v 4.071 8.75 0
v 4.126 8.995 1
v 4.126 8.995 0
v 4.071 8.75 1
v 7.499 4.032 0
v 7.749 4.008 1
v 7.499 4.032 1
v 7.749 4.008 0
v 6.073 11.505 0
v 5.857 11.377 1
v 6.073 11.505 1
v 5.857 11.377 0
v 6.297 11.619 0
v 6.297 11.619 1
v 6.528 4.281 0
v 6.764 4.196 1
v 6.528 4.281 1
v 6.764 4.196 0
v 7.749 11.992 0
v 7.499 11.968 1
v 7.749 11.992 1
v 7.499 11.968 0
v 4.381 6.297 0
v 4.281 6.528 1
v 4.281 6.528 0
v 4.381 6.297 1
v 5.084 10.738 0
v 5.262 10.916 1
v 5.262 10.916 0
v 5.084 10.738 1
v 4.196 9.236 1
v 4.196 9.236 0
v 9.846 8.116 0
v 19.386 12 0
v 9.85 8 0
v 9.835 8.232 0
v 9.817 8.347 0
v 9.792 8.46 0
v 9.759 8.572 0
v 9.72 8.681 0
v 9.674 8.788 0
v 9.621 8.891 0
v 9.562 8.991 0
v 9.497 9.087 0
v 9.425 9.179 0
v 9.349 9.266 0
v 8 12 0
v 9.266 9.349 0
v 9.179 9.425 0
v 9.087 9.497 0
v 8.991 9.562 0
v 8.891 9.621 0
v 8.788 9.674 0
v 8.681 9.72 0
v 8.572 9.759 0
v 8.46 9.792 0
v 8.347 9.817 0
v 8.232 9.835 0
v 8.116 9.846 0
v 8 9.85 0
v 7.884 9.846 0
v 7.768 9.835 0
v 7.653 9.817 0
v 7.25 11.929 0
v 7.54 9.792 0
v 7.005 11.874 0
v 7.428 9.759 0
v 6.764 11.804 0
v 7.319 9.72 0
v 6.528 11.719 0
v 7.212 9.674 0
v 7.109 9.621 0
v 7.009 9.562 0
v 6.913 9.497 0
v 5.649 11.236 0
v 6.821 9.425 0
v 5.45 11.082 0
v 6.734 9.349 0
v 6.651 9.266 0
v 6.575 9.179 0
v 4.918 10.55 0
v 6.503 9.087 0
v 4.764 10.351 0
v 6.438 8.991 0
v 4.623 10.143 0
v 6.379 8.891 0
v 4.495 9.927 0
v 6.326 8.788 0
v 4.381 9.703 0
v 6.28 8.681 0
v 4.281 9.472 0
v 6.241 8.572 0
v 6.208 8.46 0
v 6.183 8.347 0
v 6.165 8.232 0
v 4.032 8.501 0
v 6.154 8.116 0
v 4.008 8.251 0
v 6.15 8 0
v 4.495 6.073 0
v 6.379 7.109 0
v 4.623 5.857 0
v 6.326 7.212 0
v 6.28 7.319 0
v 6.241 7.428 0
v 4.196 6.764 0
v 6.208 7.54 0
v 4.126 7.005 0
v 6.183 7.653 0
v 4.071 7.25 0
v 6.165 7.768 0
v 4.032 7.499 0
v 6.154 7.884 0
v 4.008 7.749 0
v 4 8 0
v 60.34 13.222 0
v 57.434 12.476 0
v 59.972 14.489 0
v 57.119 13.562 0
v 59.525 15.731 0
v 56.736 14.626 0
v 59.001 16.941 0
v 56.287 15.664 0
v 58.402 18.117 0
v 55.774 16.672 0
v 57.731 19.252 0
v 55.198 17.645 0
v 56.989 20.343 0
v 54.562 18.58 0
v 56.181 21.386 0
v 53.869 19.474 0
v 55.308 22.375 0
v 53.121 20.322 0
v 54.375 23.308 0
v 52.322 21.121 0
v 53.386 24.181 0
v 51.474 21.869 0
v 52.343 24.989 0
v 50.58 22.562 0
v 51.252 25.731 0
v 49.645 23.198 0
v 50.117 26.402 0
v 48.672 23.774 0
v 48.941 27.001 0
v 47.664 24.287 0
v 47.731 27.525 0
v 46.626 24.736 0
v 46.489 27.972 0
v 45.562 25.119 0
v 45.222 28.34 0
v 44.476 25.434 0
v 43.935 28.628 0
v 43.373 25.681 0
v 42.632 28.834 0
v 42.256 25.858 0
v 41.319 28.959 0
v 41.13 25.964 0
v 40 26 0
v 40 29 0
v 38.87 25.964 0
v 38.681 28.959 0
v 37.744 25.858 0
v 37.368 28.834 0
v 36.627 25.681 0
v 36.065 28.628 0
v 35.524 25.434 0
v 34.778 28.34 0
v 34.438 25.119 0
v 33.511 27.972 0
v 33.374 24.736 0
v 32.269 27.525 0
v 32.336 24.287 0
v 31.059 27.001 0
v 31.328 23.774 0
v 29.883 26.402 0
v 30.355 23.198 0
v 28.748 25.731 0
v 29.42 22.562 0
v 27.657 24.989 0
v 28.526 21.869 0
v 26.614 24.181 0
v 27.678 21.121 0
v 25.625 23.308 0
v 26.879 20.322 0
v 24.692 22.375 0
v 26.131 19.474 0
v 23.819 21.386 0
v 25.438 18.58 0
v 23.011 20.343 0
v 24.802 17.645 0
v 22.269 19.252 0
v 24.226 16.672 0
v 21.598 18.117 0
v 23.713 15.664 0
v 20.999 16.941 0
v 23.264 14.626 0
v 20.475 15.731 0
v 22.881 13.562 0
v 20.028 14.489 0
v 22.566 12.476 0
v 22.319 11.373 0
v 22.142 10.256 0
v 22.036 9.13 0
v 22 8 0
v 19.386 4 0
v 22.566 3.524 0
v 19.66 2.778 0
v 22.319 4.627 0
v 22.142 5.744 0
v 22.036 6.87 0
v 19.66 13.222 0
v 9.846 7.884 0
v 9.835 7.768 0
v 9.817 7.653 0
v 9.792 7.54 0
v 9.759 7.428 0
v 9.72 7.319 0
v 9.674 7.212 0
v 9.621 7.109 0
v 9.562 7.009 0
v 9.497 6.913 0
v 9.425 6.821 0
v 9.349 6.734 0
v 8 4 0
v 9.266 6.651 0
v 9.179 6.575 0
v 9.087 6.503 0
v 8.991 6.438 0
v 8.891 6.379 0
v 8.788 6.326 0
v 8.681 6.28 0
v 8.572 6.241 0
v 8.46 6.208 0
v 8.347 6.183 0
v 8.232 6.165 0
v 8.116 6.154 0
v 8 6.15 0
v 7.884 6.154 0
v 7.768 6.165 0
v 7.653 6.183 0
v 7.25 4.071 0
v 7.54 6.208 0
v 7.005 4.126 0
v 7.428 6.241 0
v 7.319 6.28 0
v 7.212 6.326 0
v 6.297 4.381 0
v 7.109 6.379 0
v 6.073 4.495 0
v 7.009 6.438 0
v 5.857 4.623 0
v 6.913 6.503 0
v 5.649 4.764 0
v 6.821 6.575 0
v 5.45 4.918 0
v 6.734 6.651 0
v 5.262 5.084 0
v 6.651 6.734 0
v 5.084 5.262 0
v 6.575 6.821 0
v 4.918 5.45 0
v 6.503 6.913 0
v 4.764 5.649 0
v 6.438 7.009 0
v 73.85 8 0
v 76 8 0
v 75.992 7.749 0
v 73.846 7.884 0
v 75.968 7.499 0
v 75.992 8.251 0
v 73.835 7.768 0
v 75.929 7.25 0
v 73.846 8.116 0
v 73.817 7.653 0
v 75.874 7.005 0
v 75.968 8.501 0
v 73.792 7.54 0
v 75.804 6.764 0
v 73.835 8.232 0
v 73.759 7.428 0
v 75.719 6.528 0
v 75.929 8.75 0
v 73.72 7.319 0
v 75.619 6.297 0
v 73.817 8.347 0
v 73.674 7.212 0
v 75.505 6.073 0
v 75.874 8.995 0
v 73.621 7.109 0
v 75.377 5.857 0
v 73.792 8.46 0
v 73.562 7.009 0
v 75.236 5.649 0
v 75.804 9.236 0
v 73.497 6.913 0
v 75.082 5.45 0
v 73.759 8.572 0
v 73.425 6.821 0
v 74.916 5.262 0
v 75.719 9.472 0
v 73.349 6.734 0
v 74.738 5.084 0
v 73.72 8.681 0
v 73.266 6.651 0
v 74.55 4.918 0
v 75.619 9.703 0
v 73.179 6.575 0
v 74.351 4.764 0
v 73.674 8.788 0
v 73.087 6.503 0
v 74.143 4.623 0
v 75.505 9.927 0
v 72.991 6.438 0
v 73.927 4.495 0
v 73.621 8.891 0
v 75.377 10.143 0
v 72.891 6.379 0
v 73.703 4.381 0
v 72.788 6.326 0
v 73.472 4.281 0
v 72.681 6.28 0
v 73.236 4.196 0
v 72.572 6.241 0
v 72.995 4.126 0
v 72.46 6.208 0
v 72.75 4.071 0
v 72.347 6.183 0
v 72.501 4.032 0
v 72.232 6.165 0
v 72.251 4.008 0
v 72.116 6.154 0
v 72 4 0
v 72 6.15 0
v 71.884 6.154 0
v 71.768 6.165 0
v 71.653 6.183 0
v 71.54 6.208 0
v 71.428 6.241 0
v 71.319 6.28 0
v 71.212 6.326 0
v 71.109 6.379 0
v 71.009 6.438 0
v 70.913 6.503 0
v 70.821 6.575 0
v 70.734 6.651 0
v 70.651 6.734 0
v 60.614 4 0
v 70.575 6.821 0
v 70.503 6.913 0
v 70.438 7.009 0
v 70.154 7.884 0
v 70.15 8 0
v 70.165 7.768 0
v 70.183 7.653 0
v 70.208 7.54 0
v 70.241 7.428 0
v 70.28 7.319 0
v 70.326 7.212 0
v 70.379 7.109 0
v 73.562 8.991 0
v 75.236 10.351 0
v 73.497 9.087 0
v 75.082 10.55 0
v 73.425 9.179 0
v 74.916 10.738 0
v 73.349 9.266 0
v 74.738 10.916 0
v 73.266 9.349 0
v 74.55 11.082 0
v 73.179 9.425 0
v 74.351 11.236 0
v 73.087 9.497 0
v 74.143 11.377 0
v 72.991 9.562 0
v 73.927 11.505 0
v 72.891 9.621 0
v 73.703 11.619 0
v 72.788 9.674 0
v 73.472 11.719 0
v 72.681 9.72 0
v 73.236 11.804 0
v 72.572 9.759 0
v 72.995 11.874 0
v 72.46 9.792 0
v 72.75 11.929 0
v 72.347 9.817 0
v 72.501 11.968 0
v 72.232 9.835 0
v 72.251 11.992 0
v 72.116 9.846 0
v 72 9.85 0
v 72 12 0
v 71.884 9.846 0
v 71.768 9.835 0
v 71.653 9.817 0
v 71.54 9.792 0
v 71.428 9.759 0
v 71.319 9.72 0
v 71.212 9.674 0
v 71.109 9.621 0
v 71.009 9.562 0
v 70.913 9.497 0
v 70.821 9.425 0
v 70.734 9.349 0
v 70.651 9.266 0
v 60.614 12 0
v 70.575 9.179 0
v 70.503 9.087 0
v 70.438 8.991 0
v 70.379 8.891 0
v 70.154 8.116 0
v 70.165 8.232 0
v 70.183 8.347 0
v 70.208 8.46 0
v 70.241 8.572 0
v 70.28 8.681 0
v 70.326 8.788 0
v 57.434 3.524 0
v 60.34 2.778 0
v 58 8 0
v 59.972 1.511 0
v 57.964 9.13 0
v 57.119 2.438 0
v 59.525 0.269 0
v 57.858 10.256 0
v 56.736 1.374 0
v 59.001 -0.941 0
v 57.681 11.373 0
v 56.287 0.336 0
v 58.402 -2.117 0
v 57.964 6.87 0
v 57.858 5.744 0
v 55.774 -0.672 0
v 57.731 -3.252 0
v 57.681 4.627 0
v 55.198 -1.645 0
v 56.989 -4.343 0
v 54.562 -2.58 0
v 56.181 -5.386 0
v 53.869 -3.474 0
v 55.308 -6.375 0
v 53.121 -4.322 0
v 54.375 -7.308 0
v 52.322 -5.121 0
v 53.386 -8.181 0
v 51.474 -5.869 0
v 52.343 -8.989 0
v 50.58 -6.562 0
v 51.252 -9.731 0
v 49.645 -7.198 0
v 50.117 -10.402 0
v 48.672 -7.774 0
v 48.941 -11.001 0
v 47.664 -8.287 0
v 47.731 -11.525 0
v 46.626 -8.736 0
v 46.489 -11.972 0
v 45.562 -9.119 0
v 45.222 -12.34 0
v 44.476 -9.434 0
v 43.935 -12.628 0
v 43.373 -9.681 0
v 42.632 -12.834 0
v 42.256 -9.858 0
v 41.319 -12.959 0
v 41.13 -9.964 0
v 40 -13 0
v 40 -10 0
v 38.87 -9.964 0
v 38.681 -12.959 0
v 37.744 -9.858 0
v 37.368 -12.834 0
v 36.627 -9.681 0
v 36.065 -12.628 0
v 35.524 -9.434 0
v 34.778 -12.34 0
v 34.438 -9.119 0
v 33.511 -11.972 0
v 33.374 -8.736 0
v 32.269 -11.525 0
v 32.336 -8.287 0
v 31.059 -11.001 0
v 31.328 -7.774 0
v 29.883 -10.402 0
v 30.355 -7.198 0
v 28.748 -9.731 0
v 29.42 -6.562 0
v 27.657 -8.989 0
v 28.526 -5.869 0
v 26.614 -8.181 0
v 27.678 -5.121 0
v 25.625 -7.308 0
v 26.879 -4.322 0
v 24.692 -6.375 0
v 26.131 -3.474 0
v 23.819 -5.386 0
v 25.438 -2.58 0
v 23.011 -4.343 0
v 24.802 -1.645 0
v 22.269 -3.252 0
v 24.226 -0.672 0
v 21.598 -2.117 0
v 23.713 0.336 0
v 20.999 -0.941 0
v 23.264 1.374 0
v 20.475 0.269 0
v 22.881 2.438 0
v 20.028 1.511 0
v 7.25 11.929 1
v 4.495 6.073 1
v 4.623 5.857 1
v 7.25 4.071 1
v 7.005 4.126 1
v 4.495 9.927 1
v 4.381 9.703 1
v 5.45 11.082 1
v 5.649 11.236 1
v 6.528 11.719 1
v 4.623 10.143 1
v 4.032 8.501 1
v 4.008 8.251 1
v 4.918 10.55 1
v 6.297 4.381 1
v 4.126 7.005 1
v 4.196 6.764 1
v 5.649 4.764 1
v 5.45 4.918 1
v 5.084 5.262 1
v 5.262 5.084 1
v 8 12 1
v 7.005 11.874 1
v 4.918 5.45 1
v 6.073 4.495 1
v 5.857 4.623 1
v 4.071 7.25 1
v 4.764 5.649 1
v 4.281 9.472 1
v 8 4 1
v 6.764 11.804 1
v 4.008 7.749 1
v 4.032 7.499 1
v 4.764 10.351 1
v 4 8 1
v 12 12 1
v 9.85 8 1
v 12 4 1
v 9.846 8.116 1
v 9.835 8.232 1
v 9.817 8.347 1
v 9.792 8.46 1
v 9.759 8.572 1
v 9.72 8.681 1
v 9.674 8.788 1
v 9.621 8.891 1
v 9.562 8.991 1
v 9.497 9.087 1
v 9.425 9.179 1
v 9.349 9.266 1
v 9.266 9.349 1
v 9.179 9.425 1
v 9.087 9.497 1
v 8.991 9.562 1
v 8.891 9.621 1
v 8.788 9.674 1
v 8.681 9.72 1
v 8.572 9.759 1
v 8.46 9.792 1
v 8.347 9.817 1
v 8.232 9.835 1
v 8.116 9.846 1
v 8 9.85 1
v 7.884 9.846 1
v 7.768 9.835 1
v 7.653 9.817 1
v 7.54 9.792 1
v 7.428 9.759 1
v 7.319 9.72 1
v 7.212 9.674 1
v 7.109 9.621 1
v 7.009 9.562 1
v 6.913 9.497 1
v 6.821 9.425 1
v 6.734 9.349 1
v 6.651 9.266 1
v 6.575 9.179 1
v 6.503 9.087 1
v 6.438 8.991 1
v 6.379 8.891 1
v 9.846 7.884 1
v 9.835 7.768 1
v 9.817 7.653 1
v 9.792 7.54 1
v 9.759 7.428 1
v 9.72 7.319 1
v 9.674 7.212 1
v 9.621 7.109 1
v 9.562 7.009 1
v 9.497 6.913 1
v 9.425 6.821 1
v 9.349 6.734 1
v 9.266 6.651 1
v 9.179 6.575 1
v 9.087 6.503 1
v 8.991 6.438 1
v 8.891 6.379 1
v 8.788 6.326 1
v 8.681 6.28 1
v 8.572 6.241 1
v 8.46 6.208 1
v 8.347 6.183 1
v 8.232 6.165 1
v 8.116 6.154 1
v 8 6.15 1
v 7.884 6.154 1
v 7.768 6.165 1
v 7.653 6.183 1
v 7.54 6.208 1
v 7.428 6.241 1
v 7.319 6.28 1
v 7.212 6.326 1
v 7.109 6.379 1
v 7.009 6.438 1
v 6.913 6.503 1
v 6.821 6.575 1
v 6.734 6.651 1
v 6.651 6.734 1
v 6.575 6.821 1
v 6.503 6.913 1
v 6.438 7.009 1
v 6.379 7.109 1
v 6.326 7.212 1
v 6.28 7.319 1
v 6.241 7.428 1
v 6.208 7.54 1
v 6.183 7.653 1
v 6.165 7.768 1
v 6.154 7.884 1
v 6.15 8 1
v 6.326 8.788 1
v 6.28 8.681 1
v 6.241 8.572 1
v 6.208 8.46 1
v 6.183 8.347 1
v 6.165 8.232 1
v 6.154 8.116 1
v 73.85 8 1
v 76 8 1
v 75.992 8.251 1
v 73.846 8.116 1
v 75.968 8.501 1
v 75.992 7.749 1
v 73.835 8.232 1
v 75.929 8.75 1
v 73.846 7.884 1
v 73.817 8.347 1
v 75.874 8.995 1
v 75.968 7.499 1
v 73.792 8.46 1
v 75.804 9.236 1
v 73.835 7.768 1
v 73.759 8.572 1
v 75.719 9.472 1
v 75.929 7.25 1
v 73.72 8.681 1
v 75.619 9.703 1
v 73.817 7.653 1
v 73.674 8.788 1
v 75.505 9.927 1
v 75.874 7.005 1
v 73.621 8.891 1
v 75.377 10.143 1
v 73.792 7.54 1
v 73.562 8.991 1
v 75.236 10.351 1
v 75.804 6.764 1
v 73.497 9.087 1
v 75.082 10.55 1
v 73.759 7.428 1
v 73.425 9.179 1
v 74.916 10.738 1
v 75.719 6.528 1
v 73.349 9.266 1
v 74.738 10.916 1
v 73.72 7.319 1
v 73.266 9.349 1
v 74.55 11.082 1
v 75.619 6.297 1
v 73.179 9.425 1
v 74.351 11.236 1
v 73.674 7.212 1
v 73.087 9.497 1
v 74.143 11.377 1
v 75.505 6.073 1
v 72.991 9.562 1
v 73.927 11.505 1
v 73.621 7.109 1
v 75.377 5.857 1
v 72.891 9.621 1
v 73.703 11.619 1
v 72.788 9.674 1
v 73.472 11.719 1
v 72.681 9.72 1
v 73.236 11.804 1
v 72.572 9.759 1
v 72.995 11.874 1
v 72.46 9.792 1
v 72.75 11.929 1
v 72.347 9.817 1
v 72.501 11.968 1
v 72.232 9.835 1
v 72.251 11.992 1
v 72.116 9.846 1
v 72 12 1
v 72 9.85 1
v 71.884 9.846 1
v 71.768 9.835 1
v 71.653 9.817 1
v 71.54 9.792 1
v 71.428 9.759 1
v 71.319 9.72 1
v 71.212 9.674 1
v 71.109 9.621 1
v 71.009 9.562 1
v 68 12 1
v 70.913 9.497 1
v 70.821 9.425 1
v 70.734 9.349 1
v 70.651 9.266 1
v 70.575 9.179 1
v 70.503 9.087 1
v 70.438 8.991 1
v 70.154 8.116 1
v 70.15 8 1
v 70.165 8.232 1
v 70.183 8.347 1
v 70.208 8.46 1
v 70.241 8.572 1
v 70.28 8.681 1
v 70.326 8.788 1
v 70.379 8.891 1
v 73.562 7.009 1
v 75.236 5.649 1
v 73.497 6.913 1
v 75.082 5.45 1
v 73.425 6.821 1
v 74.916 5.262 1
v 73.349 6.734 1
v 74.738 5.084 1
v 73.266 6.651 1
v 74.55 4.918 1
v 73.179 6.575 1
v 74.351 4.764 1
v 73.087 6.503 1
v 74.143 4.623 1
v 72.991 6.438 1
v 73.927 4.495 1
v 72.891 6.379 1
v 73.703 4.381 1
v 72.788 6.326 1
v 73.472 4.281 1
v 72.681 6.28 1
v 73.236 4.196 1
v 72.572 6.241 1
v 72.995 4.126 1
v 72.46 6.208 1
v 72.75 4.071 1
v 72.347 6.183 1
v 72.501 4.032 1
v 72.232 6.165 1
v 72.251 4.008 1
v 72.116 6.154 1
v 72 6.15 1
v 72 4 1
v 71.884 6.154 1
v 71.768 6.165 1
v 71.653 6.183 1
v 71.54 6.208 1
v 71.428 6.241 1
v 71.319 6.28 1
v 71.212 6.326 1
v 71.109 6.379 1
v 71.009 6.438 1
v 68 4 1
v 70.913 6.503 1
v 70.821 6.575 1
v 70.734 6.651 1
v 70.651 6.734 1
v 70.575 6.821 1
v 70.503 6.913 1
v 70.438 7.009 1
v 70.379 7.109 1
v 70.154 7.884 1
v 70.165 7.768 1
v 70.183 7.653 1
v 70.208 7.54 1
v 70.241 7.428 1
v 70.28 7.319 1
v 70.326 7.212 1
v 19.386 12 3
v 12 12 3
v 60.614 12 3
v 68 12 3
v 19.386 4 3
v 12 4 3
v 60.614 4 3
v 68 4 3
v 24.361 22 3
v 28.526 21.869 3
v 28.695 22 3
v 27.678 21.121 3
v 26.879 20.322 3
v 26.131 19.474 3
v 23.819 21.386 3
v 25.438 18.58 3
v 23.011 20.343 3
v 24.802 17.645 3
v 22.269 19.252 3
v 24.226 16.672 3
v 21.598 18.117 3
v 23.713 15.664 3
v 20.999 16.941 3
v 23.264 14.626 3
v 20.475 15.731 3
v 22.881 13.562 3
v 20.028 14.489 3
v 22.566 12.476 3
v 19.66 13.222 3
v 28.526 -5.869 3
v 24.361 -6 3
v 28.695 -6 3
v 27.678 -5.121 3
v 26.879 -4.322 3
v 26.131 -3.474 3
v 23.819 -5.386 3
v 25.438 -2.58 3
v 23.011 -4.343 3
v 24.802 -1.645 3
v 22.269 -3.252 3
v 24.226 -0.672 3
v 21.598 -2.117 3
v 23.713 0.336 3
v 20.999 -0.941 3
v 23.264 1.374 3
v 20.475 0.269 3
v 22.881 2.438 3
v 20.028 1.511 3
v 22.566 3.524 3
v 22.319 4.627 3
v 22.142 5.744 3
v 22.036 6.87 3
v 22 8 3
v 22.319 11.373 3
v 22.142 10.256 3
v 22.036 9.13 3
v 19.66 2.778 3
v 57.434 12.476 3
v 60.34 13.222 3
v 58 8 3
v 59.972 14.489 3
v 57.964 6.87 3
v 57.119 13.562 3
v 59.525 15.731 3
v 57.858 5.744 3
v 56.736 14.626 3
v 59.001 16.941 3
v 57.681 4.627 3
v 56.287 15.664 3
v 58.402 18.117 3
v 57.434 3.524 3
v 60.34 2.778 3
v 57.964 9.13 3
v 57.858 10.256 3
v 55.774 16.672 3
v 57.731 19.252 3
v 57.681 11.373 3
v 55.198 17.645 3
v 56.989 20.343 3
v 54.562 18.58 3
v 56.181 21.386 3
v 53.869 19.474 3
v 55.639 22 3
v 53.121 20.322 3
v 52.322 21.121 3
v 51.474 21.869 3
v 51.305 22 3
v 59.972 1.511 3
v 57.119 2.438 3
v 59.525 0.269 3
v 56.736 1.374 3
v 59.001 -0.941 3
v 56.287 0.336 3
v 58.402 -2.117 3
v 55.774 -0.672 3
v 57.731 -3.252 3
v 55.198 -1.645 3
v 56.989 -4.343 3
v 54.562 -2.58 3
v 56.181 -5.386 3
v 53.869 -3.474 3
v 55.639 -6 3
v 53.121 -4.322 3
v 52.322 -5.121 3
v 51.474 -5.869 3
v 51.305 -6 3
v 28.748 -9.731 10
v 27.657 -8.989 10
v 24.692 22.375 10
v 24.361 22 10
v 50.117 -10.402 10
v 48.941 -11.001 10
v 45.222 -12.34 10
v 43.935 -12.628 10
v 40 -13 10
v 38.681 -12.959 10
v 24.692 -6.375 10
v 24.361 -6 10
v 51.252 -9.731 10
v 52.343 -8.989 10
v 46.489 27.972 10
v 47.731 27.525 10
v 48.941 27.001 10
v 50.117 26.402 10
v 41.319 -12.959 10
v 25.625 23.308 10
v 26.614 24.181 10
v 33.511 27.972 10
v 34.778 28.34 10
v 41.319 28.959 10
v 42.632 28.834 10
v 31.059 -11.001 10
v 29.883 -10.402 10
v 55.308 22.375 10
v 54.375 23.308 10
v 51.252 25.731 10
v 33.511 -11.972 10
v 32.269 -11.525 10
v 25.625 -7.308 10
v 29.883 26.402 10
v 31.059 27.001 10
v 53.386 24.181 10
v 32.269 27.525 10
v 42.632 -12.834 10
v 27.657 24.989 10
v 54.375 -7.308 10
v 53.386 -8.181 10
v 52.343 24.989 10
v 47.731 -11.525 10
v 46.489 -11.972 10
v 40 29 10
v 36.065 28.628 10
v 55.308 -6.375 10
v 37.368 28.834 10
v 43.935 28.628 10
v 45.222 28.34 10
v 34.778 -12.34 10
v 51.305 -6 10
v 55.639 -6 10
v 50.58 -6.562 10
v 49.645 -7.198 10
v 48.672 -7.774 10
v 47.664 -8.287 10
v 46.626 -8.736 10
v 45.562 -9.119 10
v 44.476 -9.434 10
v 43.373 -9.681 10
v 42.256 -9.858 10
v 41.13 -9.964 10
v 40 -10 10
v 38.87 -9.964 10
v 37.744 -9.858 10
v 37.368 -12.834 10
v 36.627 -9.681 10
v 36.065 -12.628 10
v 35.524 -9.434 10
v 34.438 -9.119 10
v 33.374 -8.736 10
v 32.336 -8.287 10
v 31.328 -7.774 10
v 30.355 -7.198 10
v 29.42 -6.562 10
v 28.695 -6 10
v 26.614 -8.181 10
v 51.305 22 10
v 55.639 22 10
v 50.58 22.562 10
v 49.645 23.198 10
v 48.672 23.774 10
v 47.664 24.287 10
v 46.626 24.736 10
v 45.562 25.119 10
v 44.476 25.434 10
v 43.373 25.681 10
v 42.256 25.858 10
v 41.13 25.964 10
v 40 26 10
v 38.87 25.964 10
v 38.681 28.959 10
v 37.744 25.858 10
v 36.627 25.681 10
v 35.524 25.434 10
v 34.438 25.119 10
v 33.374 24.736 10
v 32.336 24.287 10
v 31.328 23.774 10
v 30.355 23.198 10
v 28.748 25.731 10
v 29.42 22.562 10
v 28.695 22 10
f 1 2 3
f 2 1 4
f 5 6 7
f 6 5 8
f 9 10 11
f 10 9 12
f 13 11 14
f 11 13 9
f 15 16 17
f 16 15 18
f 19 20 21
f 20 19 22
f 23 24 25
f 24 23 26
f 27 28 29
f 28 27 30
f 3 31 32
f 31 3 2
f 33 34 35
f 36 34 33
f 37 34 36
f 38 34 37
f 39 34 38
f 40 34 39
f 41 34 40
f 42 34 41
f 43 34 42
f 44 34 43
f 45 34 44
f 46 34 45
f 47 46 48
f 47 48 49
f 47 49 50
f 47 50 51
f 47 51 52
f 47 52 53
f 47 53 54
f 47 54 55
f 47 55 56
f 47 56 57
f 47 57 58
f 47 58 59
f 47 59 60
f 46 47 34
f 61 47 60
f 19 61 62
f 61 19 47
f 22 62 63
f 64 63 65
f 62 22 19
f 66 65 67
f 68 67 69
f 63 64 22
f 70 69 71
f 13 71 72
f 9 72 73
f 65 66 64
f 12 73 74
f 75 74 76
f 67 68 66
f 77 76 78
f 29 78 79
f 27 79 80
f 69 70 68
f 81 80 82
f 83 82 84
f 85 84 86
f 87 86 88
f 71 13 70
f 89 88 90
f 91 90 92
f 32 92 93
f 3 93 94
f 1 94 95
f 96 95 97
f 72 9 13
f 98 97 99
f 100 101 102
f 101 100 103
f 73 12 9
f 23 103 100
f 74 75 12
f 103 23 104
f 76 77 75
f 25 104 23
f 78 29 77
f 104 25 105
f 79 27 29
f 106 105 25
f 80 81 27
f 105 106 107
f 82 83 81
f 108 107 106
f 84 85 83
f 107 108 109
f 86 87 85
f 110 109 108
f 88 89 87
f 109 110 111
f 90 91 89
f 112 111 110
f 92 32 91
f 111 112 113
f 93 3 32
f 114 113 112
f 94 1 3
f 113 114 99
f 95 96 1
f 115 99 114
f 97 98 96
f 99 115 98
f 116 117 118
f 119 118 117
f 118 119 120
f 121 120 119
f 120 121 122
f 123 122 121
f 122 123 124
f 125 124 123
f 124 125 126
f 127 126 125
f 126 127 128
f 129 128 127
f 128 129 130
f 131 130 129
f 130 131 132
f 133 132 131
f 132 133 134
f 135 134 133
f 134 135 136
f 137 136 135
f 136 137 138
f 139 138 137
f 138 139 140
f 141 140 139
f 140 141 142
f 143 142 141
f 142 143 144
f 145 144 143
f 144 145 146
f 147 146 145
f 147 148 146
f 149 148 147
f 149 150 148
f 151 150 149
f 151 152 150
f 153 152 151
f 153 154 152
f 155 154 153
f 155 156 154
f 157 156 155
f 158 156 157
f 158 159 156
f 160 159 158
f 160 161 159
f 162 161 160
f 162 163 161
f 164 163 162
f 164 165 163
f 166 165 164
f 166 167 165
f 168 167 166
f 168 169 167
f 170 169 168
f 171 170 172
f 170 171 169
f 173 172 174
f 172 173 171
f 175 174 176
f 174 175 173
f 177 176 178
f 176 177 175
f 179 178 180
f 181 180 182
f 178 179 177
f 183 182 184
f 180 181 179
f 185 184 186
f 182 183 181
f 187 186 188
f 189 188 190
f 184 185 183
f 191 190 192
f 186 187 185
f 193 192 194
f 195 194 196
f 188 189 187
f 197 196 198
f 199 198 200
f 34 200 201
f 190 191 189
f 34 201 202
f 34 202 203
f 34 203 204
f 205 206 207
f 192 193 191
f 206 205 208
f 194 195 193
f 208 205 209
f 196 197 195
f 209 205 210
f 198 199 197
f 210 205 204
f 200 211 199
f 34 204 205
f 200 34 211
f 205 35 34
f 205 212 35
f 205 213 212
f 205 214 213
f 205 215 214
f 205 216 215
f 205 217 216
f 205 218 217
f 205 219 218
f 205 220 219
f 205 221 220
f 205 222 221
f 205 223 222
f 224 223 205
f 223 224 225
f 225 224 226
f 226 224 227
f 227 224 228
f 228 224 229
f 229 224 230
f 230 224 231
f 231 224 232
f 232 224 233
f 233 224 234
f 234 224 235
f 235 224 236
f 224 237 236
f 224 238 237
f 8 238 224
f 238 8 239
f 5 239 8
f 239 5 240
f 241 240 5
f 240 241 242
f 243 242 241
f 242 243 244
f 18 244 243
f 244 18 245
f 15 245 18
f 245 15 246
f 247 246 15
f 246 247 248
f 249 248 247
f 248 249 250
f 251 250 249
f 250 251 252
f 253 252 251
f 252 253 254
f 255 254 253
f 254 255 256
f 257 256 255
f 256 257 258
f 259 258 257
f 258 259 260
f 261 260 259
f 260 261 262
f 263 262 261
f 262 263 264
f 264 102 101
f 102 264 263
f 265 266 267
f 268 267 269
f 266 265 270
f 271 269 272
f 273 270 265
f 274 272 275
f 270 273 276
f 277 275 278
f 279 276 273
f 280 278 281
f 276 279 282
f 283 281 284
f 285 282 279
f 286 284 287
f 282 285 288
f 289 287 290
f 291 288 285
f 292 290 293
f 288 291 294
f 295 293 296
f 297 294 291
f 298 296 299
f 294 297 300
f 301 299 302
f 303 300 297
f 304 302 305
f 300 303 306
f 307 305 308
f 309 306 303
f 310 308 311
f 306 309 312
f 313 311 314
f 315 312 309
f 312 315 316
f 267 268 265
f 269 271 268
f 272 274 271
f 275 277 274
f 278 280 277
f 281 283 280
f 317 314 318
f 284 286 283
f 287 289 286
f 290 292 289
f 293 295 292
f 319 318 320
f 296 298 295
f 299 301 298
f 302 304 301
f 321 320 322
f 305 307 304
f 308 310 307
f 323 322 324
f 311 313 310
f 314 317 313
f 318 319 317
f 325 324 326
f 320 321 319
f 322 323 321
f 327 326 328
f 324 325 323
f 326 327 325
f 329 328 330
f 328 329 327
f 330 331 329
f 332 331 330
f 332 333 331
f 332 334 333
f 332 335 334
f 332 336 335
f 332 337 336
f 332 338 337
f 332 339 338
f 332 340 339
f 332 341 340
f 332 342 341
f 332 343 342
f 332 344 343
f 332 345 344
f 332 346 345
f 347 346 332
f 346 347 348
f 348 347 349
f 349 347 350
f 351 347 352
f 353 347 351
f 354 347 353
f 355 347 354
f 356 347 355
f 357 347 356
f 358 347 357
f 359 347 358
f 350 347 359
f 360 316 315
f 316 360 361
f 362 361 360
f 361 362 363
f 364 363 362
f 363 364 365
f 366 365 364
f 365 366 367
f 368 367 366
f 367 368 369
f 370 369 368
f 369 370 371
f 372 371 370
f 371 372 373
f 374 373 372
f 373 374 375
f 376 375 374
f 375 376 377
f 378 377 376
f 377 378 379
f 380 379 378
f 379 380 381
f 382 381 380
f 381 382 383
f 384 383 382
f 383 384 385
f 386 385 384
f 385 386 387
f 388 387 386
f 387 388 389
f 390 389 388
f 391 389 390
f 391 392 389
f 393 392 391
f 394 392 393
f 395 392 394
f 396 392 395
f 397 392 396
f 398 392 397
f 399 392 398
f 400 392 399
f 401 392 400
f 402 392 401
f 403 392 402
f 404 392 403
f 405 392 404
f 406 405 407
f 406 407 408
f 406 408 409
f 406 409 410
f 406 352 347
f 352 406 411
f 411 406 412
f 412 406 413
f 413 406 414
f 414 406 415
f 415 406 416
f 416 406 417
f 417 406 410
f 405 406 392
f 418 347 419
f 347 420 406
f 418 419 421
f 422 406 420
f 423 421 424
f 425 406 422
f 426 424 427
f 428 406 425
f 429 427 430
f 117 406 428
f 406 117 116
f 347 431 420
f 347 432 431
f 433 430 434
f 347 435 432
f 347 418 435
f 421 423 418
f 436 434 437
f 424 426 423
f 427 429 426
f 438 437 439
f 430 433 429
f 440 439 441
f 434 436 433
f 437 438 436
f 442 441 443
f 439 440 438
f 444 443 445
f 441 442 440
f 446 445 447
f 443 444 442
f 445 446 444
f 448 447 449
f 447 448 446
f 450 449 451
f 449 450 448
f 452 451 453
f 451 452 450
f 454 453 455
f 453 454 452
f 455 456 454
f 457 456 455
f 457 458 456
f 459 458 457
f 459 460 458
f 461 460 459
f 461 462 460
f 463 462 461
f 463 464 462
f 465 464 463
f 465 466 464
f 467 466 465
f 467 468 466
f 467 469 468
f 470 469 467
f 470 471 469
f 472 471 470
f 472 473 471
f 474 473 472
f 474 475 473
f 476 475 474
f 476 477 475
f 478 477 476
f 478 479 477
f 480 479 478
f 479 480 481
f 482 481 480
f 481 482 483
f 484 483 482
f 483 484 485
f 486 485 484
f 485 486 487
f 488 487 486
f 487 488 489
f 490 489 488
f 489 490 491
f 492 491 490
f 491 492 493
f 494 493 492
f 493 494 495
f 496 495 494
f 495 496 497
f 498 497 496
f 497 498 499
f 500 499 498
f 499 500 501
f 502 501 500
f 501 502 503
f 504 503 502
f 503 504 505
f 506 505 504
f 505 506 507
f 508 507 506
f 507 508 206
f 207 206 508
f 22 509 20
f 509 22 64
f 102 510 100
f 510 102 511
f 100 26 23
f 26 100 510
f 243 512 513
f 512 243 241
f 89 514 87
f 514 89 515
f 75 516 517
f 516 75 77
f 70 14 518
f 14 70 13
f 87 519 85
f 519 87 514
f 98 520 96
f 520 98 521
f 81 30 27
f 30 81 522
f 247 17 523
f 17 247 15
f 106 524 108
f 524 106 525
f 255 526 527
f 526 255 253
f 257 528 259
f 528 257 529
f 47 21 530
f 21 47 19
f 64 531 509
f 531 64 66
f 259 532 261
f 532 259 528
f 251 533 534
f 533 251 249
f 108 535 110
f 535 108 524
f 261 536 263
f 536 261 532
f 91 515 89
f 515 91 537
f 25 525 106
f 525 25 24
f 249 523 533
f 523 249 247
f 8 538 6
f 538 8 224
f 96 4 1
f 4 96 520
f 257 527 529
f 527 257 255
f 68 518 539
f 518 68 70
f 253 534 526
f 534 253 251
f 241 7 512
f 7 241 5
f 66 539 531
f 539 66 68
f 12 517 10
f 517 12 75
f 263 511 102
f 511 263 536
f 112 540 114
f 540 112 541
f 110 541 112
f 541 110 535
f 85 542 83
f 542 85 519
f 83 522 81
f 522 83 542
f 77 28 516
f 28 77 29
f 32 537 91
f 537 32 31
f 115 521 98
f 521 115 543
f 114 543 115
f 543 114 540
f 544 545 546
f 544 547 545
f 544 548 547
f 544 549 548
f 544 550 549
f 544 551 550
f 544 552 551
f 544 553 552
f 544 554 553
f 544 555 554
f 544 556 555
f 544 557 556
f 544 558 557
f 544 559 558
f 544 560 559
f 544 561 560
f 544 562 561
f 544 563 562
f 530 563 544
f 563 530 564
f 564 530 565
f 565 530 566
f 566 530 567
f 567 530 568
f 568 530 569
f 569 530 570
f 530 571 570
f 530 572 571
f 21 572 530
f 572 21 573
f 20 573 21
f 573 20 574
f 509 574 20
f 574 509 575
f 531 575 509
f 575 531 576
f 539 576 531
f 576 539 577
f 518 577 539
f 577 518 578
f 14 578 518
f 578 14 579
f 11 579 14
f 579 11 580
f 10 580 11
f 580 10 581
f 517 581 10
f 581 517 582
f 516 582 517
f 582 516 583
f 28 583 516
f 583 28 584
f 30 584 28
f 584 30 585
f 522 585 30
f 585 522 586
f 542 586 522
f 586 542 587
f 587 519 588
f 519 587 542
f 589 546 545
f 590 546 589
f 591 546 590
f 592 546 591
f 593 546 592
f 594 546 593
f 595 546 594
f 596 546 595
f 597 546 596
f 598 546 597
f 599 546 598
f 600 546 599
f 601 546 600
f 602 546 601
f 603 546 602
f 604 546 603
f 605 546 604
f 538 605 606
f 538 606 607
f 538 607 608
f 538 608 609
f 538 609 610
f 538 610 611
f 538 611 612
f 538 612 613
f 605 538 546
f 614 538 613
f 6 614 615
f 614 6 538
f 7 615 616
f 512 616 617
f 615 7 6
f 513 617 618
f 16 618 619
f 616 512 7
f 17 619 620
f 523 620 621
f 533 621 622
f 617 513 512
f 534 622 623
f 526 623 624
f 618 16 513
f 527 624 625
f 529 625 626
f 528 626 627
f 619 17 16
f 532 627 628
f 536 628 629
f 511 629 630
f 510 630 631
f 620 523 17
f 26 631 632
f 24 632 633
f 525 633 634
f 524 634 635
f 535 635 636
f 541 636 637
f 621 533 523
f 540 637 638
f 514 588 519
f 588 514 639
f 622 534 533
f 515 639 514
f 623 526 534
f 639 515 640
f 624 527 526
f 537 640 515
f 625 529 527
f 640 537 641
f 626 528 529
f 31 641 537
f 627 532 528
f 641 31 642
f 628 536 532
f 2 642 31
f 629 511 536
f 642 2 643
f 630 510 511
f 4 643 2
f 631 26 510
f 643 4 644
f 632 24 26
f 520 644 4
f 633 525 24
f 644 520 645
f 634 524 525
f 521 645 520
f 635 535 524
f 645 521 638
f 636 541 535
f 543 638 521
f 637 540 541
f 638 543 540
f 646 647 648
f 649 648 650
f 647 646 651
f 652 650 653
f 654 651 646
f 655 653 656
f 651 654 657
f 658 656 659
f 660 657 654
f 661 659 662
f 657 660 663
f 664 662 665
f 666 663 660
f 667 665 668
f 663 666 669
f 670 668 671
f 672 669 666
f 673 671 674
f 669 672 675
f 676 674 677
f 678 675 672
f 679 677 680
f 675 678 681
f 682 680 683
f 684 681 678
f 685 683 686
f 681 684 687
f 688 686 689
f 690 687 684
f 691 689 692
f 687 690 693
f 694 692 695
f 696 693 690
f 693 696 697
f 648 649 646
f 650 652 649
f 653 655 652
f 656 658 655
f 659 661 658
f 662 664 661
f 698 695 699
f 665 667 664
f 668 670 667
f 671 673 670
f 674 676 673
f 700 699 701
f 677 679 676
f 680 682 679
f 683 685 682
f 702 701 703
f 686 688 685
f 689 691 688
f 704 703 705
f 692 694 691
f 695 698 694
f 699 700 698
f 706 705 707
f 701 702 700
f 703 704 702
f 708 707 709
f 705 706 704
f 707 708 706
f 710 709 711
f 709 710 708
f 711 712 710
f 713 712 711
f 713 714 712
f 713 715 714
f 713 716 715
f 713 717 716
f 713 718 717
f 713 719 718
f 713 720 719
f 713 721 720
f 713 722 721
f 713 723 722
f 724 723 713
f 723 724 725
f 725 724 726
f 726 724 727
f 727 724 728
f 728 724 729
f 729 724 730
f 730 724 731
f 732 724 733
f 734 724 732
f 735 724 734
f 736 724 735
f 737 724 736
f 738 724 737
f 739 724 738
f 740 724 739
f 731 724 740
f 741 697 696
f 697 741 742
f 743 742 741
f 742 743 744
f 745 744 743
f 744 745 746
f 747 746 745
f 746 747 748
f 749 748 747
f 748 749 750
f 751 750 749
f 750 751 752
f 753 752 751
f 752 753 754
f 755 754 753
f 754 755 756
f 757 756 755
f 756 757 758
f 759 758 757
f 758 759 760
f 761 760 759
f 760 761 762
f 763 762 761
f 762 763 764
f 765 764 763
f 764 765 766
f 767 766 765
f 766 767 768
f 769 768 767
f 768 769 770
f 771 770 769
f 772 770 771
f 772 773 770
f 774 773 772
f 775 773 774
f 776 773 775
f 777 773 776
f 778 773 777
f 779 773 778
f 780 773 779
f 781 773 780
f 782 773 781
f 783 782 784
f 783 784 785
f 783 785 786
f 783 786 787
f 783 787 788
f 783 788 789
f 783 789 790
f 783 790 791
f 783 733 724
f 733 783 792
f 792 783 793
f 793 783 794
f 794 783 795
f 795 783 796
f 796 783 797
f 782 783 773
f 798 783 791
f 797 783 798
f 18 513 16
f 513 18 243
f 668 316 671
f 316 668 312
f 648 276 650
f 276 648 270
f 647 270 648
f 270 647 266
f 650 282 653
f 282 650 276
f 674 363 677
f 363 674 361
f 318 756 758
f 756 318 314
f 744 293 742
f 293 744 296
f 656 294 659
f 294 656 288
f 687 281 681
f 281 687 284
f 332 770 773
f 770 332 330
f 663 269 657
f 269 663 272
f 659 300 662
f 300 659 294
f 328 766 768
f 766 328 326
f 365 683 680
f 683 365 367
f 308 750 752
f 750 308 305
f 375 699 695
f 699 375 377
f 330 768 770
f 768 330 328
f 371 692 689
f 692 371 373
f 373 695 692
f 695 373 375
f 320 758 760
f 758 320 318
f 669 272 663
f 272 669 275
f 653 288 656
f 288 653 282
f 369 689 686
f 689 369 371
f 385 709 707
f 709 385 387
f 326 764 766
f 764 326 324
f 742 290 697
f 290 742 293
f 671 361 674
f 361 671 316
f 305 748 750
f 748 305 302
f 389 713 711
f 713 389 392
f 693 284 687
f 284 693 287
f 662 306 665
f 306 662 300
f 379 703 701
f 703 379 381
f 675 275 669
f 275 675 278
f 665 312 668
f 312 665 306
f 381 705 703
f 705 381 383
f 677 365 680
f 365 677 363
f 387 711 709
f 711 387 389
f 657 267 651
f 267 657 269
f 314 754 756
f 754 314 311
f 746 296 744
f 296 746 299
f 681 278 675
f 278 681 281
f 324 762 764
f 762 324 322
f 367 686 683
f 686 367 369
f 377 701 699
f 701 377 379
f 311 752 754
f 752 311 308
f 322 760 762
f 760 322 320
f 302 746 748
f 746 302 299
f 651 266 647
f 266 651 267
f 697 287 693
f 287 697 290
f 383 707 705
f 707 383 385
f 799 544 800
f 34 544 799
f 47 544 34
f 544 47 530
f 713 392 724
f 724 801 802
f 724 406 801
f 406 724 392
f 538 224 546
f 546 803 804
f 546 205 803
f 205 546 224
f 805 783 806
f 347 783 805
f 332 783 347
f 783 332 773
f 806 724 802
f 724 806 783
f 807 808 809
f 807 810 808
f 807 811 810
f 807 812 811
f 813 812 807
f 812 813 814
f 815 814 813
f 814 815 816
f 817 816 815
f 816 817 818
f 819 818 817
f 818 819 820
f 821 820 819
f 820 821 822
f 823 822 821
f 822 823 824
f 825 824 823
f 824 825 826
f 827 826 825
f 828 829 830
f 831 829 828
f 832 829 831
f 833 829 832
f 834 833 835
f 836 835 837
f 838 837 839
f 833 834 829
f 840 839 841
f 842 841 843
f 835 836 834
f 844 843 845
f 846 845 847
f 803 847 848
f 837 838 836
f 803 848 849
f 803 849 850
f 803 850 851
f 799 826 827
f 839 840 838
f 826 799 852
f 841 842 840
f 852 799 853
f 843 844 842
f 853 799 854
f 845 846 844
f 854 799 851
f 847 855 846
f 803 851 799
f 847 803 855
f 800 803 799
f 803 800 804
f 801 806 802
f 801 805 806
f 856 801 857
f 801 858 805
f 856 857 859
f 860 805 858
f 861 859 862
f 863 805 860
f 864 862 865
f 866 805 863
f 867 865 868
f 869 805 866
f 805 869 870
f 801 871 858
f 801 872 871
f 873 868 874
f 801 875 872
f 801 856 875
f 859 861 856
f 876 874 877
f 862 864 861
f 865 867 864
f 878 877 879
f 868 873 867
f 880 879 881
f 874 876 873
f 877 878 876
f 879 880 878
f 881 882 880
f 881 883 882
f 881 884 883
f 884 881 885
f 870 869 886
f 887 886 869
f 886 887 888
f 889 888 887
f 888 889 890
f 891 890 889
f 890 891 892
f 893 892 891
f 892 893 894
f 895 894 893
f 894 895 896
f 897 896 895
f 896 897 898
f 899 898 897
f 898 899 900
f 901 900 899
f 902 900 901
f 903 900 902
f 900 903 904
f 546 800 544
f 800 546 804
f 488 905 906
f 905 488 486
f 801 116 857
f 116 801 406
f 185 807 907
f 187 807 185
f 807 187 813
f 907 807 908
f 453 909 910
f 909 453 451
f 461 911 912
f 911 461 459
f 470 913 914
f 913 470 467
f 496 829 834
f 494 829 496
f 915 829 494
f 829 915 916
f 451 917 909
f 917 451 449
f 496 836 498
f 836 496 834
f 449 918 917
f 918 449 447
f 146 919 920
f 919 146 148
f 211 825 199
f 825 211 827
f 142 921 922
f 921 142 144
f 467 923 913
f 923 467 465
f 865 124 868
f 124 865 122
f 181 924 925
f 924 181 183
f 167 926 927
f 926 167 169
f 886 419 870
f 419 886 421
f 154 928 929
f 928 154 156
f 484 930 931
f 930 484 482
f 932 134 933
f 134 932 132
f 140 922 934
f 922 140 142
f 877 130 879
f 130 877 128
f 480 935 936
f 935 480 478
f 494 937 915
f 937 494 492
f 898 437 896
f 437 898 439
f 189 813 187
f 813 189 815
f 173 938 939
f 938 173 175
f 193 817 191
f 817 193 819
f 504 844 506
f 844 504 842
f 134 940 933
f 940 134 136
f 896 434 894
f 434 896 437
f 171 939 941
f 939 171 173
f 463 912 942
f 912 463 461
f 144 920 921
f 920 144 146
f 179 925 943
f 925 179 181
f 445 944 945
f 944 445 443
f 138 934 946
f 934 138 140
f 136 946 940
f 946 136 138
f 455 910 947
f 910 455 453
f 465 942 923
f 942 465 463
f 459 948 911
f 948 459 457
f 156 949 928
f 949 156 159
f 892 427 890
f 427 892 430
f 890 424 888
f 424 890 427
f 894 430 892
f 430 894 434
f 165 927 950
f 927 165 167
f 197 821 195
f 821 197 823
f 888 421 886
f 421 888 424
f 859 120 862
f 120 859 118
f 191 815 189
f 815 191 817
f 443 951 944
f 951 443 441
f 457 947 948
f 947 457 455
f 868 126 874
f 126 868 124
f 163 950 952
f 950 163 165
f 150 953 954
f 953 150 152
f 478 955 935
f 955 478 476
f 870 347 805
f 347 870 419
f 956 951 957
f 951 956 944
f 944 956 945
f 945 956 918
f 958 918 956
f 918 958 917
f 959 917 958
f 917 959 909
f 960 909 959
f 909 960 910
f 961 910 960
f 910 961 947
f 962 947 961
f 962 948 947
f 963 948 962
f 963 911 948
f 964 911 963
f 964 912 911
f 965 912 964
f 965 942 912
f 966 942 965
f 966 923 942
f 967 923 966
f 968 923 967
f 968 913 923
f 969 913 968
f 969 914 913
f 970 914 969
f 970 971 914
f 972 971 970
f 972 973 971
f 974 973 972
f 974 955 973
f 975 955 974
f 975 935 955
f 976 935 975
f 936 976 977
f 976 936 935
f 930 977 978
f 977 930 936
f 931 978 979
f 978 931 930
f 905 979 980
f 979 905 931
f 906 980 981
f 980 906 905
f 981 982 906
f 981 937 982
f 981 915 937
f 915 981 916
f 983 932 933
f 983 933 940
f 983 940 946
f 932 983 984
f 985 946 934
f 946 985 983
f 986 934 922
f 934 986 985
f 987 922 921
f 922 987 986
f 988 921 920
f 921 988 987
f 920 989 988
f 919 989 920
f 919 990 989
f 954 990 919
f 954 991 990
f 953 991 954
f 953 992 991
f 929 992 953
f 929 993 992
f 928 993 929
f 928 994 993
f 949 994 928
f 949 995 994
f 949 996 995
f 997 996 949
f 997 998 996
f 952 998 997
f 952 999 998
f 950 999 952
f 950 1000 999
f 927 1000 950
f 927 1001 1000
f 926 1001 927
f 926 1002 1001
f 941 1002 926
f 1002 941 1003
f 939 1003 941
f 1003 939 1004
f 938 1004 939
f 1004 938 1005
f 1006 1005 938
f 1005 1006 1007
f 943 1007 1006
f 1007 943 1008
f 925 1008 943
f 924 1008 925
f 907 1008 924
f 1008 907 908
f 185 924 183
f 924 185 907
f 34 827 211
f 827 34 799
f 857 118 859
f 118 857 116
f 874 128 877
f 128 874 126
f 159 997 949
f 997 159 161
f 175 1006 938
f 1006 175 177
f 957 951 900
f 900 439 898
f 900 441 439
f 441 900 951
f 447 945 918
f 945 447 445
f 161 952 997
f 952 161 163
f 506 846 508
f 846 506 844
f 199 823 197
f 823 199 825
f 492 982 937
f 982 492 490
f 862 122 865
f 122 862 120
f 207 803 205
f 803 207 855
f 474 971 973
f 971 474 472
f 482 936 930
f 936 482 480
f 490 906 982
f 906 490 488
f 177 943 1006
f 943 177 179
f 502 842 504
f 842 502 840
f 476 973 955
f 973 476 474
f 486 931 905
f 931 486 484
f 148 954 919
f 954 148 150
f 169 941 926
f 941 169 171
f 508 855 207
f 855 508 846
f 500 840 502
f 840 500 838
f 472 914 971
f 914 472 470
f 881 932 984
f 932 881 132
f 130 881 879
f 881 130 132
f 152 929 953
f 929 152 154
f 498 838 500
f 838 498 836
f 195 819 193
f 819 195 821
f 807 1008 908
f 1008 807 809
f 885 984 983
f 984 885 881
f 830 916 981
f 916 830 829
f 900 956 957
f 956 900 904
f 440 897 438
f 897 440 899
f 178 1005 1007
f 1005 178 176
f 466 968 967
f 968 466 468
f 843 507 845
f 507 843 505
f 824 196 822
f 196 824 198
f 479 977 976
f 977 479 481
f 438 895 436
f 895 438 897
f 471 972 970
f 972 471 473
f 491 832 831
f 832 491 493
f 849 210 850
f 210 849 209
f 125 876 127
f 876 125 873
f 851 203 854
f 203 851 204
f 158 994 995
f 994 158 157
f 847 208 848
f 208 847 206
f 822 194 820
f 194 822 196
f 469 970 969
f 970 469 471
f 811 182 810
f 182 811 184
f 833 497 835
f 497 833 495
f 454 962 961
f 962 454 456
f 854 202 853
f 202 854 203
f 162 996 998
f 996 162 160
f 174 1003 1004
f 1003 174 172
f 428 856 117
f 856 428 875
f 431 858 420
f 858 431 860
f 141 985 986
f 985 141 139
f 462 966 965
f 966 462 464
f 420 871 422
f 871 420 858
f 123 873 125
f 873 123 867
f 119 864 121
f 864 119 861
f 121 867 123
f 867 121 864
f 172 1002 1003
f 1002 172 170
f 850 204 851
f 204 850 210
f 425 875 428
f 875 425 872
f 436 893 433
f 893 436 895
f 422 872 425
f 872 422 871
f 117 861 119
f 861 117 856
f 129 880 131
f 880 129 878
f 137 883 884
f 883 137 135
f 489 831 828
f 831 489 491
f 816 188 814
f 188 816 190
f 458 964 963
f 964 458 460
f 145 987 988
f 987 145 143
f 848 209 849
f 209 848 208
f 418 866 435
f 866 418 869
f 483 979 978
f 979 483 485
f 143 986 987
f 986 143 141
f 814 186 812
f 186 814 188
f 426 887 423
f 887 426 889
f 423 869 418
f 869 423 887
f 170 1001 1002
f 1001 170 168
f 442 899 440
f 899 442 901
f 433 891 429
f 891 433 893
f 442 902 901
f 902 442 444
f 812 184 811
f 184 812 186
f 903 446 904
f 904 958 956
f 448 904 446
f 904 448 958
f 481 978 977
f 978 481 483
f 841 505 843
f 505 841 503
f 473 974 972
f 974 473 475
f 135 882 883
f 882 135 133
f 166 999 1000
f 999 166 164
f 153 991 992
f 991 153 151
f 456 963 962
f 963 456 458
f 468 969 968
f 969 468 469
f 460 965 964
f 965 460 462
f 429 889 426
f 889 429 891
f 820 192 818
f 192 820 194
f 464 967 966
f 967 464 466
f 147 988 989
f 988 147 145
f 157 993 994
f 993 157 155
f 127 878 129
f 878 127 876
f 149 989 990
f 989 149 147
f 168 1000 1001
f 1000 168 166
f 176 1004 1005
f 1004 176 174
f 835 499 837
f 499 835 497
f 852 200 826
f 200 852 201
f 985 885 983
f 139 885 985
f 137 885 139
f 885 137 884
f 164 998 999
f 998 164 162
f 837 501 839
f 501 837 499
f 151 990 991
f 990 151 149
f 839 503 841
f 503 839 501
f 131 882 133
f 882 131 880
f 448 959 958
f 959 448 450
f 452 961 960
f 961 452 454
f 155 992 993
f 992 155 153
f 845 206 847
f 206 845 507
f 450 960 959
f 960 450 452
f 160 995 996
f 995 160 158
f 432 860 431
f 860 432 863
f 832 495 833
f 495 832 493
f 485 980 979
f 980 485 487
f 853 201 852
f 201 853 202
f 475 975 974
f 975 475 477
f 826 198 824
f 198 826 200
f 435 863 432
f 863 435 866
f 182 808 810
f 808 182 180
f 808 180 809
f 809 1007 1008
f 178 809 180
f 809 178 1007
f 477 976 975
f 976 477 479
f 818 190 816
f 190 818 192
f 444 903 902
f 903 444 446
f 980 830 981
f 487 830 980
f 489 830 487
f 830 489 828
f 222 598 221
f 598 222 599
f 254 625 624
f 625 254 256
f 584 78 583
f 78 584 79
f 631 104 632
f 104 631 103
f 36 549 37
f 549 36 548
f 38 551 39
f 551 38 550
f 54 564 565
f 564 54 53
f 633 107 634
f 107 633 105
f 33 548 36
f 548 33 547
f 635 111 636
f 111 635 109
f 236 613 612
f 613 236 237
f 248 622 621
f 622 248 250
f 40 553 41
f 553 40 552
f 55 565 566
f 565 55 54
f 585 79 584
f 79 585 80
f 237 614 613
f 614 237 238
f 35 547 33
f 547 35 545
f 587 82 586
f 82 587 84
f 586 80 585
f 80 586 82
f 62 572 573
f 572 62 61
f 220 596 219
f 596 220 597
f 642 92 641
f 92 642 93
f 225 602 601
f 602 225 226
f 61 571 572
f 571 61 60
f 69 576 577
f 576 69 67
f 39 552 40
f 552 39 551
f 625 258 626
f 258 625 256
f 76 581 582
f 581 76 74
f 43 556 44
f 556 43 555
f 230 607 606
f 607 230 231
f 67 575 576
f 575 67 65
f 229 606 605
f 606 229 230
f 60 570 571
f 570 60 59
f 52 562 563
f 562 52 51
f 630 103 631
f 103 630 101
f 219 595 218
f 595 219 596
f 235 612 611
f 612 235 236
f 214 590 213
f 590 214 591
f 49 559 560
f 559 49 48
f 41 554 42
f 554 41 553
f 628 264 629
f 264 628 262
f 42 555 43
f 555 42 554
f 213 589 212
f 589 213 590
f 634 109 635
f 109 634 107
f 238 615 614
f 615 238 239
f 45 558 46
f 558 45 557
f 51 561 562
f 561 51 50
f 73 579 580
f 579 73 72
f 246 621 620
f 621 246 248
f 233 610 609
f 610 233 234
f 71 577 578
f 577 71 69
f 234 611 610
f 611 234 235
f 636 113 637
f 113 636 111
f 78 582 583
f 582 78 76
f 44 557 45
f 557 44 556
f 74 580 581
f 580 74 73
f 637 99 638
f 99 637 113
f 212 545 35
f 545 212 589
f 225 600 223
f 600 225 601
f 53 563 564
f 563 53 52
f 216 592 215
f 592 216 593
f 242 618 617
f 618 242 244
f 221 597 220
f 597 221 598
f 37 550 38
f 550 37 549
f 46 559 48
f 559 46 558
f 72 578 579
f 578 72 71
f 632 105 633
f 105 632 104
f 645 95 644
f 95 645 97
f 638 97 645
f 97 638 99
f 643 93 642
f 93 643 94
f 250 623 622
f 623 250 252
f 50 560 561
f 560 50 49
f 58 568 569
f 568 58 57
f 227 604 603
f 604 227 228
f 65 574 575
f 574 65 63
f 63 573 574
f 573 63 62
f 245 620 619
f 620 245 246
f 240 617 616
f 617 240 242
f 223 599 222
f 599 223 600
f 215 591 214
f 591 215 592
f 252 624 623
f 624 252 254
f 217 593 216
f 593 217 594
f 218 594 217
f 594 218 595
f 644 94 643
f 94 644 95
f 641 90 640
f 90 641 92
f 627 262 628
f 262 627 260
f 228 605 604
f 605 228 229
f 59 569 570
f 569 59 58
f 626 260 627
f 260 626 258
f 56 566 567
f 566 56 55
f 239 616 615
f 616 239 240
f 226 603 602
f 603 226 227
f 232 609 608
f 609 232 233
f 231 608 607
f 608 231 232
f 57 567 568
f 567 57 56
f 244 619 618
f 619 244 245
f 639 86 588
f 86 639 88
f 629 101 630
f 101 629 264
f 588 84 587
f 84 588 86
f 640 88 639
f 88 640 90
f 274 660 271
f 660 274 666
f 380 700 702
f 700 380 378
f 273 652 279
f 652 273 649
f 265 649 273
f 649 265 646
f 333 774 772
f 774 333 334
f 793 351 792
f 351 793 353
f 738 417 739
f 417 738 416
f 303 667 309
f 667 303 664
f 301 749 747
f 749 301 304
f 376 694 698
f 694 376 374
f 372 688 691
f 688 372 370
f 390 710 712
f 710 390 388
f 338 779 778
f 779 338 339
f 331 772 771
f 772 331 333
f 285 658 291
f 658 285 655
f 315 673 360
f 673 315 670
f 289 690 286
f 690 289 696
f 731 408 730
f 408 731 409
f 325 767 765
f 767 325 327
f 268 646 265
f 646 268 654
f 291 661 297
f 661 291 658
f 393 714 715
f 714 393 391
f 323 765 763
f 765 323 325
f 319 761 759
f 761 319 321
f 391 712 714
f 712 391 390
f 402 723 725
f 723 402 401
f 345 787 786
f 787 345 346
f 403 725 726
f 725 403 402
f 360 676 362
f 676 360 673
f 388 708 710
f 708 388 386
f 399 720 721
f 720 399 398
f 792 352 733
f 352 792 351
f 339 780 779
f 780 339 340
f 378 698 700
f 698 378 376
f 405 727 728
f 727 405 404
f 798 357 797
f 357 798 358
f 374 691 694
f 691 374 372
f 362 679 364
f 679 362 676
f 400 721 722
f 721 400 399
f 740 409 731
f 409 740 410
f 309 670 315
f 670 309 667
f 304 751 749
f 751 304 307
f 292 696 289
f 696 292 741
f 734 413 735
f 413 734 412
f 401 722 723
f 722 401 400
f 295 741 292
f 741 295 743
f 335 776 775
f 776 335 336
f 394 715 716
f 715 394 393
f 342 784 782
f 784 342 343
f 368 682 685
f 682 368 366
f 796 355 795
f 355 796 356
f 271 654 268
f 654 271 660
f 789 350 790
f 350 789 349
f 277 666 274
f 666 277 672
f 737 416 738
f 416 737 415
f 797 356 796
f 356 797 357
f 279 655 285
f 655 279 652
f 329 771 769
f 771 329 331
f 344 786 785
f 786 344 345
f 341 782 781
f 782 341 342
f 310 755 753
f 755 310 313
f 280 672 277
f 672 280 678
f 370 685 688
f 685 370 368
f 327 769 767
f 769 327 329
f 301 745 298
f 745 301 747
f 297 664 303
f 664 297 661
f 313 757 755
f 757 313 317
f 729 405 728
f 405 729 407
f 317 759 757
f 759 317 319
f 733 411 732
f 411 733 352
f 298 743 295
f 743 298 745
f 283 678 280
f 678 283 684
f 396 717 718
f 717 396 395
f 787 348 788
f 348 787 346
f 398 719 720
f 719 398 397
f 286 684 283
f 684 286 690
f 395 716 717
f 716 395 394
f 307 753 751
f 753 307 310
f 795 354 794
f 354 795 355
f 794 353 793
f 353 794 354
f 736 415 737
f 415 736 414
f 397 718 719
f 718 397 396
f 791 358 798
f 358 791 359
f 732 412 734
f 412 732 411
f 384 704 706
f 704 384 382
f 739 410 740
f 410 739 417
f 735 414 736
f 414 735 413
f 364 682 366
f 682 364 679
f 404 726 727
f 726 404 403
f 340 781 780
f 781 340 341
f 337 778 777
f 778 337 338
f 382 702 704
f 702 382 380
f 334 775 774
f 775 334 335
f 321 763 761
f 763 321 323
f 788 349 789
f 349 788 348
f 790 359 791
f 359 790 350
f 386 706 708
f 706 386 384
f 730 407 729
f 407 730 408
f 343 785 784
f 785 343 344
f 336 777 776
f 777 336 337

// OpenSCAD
difference(){
	union(){

        
        translate([8,8,0]){
            rotate([0,0,0]){
                cylinder(h=1, r=4, $fn=100, center=false);
            }
        }
        translate([0+38+16+10+8,8,0]){
            rotate([0,0,0]){
                cylinder(h=1, r=4, $fn=100, center=false);
            }
        }
     

        translate([-4+12,-4-3+11,0]){
            cube([38+4+21+25-24,8,1], center=false);
        }         

        translate([-4+12+4,-4-3+11,0]){
            cube([38+4+21+25-24-8,8,3], center=false);
        }         

        translate([-7.5+54-32,-17+11.5,0]){
            translate([51/2,27/2,0]){
                rotate([0,0,0]){
                    cylinder(h=10, r=21.0, $fn=100, center=false);
                }
            }  

        }     

    


	}
	union() {
        translate([0,-6,3]){
            cube([100,28,39], center=false);
        }  

         

        translate([-7.5+54-32,-17+11.5,-15]){
            translate([51/2,27/2,0]){
                rotate([0,0,0]){
                    cylinder(h=40, r=18.0, $fn=100, center=false);
                }
            }  

        }   
  
        translate([8,8,-1]){
            rotate([0,0,0]){
                cylinder(h=52, r=3.7/2, $fn=100, center=false);
            }
        }
        translate([0+38+16+10+8,8,-1]){
            rotate([0,0,0]){
                cylinder(h=52, r=3.7/2, $fn=100, center=false);
            }
        }


      
	}
}
